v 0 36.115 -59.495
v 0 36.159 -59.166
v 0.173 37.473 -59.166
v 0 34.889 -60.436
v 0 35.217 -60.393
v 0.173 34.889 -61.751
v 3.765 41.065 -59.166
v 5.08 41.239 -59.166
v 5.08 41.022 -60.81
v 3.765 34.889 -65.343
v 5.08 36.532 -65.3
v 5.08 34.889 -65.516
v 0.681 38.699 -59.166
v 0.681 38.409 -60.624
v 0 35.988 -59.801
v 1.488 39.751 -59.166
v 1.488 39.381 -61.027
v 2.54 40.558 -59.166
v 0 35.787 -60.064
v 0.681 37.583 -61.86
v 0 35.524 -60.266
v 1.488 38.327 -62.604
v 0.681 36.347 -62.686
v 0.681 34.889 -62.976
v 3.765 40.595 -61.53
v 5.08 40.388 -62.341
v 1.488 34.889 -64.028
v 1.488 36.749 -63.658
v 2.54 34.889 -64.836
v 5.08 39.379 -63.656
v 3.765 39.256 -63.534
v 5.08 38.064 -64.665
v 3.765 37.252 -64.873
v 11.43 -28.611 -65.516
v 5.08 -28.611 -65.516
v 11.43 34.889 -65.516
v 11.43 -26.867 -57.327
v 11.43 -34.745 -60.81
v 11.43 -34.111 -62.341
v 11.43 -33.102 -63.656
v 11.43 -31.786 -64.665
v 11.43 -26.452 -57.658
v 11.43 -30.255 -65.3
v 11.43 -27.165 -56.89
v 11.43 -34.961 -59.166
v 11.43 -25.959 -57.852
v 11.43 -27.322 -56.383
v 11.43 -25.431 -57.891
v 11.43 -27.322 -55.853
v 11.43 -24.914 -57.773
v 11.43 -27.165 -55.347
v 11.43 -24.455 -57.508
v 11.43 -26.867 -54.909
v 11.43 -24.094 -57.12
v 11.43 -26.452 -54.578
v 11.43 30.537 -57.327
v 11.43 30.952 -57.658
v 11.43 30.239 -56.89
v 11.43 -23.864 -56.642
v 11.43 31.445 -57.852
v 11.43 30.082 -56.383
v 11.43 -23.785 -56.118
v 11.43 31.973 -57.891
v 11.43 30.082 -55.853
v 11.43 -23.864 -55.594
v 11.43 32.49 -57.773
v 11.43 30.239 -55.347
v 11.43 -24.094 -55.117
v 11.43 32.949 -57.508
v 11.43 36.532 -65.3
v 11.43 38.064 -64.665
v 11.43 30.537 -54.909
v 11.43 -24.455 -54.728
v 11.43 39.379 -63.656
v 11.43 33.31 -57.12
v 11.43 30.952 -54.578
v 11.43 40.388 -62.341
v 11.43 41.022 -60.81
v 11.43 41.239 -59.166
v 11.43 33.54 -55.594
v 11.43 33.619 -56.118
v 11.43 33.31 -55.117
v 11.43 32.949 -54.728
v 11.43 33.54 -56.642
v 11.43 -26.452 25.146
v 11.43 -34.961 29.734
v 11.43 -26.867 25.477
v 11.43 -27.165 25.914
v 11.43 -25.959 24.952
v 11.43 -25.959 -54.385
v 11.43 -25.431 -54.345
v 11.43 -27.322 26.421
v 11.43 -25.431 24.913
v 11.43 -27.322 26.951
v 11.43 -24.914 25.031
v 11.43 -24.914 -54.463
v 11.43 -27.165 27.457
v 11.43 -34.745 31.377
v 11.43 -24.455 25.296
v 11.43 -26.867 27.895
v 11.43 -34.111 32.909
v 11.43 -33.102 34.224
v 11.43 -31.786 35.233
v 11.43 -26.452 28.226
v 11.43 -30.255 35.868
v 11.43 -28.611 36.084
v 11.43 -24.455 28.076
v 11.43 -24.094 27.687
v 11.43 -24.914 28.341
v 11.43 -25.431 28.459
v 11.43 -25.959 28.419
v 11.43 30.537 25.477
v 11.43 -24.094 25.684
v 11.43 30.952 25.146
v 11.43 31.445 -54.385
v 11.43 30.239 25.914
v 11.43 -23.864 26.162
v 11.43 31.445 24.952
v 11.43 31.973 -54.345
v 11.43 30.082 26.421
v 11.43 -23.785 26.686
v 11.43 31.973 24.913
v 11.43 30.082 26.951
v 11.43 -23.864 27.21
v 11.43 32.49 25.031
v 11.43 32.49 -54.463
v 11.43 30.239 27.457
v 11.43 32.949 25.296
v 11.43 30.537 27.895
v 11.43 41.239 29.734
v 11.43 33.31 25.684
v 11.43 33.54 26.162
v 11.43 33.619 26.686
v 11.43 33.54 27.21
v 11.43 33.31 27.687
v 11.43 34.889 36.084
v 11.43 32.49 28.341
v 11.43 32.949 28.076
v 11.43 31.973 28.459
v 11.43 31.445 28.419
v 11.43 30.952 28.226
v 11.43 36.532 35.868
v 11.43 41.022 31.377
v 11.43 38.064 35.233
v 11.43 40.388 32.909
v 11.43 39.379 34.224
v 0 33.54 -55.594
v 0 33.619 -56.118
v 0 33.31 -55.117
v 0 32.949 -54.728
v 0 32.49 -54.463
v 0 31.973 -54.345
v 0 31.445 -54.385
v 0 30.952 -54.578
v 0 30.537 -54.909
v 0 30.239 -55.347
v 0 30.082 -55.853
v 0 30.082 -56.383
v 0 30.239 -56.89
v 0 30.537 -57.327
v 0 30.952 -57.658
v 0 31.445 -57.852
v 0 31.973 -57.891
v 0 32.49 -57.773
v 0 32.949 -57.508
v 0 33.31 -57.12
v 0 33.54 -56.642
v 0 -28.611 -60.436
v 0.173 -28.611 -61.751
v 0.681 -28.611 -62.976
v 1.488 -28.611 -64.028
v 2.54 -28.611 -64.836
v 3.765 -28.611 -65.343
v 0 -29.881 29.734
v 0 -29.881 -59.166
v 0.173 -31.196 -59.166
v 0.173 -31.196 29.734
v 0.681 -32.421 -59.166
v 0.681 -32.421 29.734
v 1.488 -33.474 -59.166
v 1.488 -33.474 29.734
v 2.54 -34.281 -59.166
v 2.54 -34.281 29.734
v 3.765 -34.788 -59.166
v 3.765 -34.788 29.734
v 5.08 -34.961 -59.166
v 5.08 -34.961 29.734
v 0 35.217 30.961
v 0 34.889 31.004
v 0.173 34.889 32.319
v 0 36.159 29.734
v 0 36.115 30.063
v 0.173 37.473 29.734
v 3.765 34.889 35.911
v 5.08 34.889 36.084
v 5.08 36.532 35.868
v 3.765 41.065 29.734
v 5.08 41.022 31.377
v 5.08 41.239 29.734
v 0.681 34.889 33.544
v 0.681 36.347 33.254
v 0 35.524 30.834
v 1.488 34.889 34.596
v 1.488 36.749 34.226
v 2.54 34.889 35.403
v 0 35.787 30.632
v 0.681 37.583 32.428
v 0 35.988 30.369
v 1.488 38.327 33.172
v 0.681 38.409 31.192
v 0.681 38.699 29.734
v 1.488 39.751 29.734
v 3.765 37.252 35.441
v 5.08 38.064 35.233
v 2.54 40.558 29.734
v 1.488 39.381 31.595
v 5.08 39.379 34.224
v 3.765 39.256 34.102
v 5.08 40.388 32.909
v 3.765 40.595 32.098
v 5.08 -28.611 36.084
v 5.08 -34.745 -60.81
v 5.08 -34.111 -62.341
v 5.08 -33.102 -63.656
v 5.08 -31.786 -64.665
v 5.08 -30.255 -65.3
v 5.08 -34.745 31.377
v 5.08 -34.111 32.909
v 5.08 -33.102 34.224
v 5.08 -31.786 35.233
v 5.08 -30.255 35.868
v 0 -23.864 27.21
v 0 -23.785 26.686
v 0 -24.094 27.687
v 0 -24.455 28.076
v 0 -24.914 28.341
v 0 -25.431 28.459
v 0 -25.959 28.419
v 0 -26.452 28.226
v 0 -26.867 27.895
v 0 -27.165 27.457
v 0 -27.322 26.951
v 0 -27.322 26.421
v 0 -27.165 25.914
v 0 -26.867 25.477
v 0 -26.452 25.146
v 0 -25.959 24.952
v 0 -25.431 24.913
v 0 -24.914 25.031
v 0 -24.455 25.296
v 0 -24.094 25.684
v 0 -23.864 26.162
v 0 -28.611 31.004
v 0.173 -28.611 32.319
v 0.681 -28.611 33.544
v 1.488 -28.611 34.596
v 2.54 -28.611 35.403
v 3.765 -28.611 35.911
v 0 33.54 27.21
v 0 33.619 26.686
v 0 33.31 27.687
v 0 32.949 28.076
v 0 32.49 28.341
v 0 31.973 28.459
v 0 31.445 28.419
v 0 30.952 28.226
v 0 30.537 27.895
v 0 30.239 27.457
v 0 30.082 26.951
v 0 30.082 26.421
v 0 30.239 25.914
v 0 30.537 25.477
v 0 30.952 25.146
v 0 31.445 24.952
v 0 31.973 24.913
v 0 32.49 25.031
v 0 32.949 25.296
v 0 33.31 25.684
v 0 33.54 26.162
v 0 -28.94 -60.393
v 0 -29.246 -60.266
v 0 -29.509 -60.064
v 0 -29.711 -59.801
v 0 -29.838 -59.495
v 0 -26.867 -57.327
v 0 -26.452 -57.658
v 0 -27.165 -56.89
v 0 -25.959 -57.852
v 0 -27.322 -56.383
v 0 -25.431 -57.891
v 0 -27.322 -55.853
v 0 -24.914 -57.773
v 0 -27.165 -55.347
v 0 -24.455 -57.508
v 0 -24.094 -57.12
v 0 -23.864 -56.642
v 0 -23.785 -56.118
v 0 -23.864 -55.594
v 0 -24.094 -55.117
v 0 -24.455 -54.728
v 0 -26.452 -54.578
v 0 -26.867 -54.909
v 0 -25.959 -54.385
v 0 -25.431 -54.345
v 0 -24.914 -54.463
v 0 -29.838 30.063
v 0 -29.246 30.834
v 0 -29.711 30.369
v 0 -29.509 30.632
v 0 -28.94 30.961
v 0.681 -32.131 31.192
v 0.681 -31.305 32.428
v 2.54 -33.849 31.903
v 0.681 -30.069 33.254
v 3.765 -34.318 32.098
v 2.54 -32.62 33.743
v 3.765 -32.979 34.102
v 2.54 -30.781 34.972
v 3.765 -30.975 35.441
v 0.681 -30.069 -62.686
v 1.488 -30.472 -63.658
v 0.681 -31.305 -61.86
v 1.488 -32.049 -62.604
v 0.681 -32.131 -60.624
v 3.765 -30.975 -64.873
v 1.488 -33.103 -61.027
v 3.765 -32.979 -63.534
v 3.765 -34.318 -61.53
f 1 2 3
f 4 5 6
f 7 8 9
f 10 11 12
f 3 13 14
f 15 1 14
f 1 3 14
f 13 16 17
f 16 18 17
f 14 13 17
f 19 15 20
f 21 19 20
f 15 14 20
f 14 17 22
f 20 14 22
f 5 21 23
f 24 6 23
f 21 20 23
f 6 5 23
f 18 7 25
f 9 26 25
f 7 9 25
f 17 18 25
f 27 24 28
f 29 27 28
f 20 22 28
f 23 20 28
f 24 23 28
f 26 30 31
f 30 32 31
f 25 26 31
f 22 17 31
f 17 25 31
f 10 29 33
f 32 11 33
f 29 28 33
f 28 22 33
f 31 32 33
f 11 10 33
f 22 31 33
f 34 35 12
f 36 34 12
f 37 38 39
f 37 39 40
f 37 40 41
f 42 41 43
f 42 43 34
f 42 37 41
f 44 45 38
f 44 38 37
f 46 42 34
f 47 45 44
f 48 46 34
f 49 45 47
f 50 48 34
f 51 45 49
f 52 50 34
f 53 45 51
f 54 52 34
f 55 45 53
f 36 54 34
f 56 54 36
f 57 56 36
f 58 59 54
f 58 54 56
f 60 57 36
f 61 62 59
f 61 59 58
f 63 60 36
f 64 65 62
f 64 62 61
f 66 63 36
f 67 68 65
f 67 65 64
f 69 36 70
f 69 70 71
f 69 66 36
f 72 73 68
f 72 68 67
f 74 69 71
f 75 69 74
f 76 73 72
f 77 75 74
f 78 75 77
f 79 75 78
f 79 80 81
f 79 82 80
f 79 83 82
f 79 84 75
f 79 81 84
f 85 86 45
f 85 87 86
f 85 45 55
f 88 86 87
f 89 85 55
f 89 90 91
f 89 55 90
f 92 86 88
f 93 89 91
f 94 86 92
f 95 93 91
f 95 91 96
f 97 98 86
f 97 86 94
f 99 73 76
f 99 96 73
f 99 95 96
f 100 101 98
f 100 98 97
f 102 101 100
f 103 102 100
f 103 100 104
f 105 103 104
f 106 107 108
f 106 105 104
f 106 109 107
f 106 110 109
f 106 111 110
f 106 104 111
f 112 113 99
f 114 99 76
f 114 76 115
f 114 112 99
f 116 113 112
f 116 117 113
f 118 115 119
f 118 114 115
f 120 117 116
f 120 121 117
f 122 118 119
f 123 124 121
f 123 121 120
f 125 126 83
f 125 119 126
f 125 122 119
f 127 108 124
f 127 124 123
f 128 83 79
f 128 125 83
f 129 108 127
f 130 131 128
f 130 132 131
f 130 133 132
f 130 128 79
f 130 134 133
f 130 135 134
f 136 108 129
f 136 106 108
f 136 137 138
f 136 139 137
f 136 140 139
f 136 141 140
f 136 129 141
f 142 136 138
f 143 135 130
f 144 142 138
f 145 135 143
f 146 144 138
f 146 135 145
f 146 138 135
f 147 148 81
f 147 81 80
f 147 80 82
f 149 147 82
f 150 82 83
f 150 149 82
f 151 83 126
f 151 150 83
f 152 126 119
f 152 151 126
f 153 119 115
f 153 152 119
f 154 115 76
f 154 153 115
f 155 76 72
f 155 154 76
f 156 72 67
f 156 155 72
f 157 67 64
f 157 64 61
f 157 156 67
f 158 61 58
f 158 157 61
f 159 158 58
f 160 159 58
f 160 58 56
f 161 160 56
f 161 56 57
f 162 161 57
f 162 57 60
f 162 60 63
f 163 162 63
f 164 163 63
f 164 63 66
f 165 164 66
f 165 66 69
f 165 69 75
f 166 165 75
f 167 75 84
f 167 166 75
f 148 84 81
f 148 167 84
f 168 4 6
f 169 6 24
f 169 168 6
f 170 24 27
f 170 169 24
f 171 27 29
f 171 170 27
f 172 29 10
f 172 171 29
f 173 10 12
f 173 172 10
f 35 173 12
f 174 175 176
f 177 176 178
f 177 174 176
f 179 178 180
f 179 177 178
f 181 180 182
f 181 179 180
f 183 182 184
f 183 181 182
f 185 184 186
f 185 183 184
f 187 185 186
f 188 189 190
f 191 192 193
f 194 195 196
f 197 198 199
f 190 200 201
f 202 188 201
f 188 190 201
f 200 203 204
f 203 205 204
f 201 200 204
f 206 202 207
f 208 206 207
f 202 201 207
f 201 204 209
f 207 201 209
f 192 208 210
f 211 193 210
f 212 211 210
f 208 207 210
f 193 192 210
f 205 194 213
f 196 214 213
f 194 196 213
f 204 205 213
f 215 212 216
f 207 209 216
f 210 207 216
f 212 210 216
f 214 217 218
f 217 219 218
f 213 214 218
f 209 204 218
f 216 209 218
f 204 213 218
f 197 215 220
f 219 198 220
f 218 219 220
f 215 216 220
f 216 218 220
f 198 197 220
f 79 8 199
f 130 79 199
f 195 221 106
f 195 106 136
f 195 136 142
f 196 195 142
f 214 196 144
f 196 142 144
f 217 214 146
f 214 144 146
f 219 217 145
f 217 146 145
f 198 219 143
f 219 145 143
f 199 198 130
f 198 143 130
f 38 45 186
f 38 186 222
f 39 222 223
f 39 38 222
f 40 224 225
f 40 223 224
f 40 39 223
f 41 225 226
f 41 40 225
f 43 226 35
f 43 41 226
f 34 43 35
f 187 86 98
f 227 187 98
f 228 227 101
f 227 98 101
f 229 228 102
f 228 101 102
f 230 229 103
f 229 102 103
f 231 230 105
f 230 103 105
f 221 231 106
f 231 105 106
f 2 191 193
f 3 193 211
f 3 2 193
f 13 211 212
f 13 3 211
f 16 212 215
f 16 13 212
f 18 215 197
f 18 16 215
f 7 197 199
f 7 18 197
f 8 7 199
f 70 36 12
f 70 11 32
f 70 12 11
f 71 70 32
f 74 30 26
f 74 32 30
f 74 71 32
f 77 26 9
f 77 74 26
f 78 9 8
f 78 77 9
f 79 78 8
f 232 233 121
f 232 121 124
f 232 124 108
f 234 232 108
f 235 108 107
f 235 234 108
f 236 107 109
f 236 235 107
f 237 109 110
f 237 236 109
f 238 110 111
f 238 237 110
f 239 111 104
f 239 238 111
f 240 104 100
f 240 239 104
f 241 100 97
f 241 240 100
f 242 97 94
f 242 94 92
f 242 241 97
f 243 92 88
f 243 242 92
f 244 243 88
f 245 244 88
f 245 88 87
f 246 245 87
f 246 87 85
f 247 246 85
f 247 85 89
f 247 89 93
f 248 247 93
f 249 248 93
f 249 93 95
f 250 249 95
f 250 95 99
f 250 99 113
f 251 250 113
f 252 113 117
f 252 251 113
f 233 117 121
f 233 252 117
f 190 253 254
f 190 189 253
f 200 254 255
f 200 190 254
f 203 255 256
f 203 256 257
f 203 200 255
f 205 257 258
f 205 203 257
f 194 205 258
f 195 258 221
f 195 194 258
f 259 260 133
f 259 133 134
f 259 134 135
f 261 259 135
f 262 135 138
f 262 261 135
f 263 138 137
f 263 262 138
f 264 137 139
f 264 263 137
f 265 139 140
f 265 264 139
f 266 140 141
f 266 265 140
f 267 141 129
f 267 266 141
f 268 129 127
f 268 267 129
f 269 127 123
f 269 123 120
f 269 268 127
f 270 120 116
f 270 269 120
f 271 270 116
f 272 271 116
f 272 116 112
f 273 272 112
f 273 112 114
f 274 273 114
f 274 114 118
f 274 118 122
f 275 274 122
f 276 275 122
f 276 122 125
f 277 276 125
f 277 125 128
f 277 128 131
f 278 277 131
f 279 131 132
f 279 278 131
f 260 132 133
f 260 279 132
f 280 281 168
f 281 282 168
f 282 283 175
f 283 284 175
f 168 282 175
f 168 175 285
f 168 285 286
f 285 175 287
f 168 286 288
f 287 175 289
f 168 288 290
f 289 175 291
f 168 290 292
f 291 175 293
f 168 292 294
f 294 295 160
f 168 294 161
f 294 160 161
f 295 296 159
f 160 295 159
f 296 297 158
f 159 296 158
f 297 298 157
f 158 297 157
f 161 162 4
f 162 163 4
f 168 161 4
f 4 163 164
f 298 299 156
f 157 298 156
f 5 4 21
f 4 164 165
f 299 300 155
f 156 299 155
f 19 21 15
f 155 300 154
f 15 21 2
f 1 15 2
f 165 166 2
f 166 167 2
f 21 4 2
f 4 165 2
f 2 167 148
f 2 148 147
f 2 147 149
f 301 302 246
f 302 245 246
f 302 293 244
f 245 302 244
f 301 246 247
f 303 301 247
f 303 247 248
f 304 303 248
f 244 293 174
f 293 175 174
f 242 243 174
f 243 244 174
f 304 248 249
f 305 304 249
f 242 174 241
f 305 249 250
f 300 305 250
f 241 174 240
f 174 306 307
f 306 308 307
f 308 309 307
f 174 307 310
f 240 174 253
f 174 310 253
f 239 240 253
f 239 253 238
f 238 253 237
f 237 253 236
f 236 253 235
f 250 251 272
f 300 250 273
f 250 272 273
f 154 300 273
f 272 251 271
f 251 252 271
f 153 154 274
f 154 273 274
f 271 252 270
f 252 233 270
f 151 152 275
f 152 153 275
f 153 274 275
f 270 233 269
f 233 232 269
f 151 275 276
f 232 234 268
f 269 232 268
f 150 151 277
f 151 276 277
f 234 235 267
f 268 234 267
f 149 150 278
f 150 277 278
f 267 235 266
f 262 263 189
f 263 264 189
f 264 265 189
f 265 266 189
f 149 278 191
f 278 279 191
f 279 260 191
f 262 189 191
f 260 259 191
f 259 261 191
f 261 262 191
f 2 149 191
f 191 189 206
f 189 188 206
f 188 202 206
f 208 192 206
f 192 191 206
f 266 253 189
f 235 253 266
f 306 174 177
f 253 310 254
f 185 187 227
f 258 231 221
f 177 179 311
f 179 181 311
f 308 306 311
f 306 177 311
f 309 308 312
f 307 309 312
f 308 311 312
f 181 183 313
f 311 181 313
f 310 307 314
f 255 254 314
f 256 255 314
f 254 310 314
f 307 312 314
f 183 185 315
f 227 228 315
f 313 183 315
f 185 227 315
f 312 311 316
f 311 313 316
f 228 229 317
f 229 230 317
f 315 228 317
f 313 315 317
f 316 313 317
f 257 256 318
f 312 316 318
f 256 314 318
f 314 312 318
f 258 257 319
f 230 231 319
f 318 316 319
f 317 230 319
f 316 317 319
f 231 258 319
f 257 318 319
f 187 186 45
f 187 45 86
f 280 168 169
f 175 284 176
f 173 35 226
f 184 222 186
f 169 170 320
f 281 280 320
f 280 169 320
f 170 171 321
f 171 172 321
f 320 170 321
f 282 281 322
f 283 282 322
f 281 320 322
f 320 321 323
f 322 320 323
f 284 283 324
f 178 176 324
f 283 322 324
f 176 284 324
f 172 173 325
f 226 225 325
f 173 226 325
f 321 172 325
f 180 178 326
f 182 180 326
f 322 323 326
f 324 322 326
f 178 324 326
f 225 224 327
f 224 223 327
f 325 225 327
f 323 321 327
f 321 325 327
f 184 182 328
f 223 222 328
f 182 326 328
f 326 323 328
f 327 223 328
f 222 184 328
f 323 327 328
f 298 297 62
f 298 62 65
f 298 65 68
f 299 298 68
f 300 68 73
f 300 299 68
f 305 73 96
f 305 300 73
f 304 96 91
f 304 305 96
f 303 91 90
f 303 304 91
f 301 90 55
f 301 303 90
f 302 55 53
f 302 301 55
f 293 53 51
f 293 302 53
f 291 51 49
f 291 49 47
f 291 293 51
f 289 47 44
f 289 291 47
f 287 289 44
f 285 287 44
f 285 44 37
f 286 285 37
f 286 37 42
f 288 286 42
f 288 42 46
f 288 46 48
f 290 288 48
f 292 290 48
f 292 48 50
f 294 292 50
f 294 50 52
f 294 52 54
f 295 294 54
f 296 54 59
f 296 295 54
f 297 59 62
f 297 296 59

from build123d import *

# Parameters (mm, degrees)
F0_W     = 76.2
F0_H     = 101.6
F0_R     = 1.778
F1_DEPTH = 11.43
F2_R     = 6.35
F3_R     = 5.08


with BuildPart() as f1:
    # F0 (on Right) → F1 (new body)
    with BuildSketch(Plane.YZ):
        with Locations((3.138589, -14.71612)):
            Rectangle(F0_W, F0_H)
        with Locations((-25.563411, -56.11812)):
            Circle(F0_R, mode=Mode.SUBTRACT)
        with Locations((31.840589, -56.11812)):
            Circle(F0_R, mode=Mode.SUBTRACT)
        with Locations((-25.563411, 26.68588)):
            Circle(F0_R, mode=Mode.SUBTRACT)
        with Locations((31.840589, 26.68588)):
            Circle(F0_R, mode=Mode.SUBTRACT)
    extrude(amount=F1_DEPTH)

    # F2
    f2_edges = [f1.edges().sort_by_distance(p)[0] for p in [
        (5.715, 41.238589, 36.08388),
        (5.715, 41.238589, -65.51612),
        (5.715, -34.961411, 36.08388),
        (5.715, -34.961411, -65.51612),
    ]]
    fillet(f2_edges, radius=F2_R)

    # F3
    f3_edges = [f1.edges().sort_by_distance(p)[0] for p in [
        (0, 3.138589, 36.08388),
    ]]
    fillet(f3_edges, radius=F3_R)


solid = f1.part
